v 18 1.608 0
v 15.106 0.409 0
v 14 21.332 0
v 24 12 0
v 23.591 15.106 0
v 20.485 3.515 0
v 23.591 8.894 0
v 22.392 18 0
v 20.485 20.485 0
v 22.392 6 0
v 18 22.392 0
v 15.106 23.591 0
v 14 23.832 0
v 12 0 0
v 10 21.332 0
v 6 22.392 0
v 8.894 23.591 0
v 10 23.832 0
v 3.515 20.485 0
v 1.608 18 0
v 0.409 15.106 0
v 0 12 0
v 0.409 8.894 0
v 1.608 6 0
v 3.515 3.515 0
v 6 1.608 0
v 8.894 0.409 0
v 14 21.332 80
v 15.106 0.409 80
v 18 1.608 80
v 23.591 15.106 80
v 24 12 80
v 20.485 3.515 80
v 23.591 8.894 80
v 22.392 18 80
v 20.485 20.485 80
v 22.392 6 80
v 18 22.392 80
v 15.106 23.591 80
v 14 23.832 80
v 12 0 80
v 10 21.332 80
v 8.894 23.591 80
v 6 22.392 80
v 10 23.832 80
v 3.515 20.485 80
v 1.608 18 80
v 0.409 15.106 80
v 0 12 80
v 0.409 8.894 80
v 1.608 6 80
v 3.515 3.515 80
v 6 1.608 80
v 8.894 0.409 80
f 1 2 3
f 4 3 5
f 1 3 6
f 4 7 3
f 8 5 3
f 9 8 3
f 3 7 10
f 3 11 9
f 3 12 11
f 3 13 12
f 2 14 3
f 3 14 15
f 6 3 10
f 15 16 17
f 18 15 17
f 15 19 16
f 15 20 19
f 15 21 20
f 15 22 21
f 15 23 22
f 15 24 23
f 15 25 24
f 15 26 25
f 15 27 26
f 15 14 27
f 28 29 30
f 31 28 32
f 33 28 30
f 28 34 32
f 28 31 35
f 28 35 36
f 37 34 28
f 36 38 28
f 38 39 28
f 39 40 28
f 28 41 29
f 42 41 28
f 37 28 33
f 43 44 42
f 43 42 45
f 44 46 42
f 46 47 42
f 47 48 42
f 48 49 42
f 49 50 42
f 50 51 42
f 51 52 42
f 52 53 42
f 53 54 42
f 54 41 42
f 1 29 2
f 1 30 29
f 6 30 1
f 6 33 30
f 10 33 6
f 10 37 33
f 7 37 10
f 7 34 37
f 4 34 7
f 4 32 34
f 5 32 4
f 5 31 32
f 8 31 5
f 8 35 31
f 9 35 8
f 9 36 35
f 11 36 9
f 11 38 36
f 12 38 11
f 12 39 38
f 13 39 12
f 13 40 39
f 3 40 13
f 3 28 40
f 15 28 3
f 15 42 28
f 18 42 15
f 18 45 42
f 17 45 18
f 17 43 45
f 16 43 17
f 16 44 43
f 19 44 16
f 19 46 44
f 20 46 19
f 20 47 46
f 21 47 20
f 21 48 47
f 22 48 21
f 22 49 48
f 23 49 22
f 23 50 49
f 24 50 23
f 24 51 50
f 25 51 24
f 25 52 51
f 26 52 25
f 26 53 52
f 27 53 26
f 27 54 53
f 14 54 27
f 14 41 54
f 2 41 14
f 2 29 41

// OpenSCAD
$fn = 32;

// ----------------------------------------------------------------------
// Keyway shaft: d24 shaft, key 4 x 2.5 mm
// ----------------------------------------------------------------------

// --- parameters (mm) ---
shaft_r = 12;             // shaft radius
key_w = 4;                // keyway width
key_d = 2.5;              // keyway depth below the surface line
plate_t = 80;             // shaft length, Z (extrusion height)

shaft_d = 2 * shaft_r;  // shaft diameter
circle_step = 15;  // polygon sampling step, degrees

profile = [[8.894, 23.591], [6, 22.392], [3.515, 20.485], [1.608, 18], [0.409, 15.106], [0, 12], [0.409, 8.894], [1.608, 6], [3.515, 3.515], [6, 1.608], [8.894, 0.409], [12, 0], [15.106, 0.409], [18, 1.608], [20.485, 3.515], [22.392, 6], [23.591, 8.894], [24, 12], [23.591, 15.106], [22.392, 18], [20.485, 20.485], [18, 22.392], [15.106, 23.591], [14, 23.832], [14, 21.332], [10, 21.332], [10, 23.832]];  // primary outline, 27 points, counter clockwise

// --- the one profile operation ---
linear_extrude(height = plate_t) polygon(points = profile);
